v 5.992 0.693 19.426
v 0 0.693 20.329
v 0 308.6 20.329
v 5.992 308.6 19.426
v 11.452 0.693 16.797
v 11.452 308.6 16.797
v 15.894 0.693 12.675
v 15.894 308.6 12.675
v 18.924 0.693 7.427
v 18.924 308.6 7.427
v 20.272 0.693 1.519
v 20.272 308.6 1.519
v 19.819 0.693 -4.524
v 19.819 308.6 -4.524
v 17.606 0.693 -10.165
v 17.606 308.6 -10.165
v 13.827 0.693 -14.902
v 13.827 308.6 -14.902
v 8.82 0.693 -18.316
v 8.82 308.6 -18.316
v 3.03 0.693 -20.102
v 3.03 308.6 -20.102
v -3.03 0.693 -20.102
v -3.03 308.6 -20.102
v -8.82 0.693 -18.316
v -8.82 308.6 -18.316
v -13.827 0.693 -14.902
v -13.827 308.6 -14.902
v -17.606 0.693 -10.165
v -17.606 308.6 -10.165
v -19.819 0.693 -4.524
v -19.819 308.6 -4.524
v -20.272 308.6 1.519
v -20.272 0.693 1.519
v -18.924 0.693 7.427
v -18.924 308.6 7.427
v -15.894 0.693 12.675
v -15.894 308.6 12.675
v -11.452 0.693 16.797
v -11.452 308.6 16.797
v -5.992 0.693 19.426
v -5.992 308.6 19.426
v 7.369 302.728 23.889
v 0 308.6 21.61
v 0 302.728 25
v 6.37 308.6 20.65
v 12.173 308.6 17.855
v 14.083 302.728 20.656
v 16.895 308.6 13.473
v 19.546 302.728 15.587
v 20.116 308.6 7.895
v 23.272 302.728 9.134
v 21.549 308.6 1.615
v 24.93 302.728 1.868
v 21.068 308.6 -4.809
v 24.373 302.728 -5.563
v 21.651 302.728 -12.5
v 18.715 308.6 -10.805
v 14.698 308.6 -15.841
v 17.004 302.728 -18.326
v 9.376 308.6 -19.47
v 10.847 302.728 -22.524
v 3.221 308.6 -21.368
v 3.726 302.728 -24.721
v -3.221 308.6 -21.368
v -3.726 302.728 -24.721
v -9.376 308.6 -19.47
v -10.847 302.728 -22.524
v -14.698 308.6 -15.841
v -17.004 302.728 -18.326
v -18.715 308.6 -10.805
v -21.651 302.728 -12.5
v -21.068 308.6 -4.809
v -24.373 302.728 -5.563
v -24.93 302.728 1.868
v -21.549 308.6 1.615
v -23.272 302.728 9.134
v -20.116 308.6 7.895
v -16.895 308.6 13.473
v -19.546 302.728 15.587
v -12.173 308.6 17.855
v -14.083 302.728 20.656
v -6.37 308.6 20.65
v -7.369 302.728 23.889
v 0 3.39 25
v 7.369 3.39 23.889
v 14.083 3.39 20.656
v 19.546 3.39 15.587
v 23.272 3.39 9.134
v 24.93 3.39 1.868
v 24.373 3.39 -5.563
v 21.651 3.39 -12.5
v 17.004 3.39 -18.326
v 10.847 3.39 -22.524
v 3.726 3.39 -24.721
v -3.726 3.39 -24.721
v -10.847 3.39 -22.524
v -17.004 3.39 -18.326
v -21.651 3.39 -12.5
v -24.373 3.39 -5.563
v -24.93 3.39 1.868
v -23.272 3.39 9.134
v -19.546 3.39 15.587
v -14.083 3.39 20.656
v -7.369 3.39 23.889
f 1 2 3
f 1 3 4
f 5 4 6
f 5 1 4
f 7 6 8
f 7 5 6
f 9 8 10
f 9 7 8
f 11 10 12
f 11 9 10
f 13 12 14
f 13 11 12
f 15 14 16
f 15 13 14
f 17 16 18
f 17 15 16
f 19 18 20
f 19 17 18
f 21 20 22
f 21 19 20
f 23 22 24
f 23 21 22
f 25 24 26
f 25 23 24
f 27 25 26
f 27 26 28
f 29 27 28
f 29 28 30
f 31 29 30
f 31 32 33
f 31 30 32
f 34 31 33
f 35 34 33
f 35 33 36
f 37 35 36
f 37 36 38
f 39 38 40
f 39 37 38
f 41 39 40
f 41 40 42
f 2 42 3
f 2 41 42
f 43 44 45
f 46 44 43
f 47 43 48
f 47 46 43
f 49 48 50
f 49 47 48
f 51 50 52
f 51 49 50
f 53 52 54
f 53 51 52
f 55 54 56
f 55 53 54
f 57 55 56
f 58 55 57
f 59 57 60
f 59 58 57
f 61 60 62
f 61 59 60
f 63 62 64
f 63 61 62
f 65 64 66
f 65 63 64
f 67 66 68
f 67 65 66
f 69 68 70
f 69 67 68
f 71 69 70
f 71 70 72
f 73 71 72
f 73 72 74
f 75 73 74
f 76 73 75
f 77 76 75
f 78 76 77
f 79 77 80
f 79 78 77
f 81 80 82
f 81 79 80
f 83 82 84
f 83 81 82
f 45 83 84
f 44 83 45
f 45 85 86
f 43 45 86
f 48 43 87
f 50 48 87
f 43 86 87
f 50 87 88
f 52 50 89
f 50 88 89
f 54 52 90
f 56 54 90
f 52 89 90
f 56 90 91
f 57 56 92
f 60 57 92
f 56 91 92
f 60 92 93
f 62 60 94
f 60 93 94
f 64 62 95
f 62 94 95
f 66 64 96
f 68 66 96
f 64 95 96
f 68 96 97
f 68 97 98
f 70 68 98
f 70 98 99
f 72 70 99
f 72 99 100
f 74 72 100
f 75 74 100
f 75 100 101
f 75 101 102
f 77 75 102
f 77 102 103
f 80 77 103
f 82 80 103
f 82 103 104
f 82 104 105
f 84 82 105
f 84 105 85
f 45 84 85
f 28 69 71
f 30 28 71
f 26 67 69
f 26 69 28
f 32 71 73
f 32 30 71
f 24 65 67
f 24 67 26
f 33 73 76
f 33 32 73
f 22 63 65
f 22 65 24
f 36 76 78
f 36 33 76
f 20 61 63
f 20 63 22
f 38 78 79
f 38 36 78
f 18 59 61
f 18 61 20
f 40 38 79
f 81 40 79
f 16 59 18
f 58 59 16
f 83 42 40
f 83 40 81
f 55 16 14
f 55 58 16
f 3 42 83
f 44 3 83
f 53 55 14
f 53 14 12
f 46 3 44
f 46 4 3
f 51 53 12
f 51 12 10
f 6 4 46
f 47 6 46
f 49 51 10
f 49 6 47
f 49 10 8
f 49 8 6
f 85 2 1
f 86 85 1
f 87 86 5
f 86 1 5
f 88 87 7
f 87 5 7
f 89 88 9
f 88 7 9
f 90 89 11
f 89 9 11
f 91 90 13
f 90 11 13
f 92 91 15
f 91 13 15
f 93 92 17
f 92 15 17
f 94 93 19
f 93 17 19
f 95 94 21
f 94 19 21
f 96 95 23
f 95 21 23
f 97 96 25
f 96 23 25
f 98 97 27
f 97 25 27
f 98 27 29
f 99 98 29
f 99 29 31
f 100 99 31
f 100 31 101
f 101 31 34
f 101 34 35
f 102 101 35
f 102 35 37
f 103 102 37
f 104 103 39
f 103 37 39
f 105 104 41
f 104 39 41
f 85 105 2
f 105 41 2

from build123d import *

# Parameters (mm, degrees)
SKETCH1_R           = 25
BOSS_EXTRUDE1_DEPTH = 308.600418
SKETCH2_R           = 20.329088143
CUT_EXTRUDE1_DEPTH  = 311.619088257
CHAMFER1_SIZE       = 5.871972
CHAMFER1_SIZE_2     = 3.390185


with BuildPart() as part:
    # Sketch1 → Boss-Extrude1 (new body)
    with BuildSketch(Plane(origin=(0, 0, 0), x_dir=(1, 0, 0), z_dir=(0, 1, 0))):
        with Locations(Location((0, 0, 0), (0, 0, 270))):
            Circle(SKETCH1_R)
    extrude(amount=BOSS_EXTRUDE1_DEPTH)

    # Sketch2 → Cut-Extrude1 (cut, through all)
    with BuildSketch(Plane(origin=(0, 0, 0), x_dir=(1, 0, 0), z_dir=(0, 1, 0))):
        with Locations(Location((0, 0, 0), (0, 0, 270))):
            Circle(SKETCH2_R)
    extrude(amount=CUT_EXTRUDE1_DEPTH, mode=Mode.SUBTRACT)

    # Chamfer1
    # the kernel refuses this chamfer: 5.871972, 3.390185 mm, written as the material it takes off along each edge
    with BuildSketch(Plane(origin=(0, 308.600418, 0), x_dir=(0, 0, 1), z_dir=(-1, 0, 0))) as chamfer1_piece_1:
        Polygon((25, -CHAMFER1_SIZE), (25 - CHAMFER1_SIZE_2, 0), (25, 0), align=None)
    revolve(axis=Axis((0, 308.600418, 0), (0, 1, 0)), mode=Mode.SUBTRACT)
    with BuildSketch(Plane(origin=(0, 0, 0), x_dir=(0, 0, 1), z_dir=(-1, 0, 0))) as chamfer1_piece_2:
        Polygon((25, CHAMFER1_SIZE_2), (25 - CHAMFER1_SIZE, 0), (25, 0), align=None)
    revolve(axis=Axis((0, 0, 0), (0, 1, 0)), mode=Mode.SUBTRACT)


solid = part.part
